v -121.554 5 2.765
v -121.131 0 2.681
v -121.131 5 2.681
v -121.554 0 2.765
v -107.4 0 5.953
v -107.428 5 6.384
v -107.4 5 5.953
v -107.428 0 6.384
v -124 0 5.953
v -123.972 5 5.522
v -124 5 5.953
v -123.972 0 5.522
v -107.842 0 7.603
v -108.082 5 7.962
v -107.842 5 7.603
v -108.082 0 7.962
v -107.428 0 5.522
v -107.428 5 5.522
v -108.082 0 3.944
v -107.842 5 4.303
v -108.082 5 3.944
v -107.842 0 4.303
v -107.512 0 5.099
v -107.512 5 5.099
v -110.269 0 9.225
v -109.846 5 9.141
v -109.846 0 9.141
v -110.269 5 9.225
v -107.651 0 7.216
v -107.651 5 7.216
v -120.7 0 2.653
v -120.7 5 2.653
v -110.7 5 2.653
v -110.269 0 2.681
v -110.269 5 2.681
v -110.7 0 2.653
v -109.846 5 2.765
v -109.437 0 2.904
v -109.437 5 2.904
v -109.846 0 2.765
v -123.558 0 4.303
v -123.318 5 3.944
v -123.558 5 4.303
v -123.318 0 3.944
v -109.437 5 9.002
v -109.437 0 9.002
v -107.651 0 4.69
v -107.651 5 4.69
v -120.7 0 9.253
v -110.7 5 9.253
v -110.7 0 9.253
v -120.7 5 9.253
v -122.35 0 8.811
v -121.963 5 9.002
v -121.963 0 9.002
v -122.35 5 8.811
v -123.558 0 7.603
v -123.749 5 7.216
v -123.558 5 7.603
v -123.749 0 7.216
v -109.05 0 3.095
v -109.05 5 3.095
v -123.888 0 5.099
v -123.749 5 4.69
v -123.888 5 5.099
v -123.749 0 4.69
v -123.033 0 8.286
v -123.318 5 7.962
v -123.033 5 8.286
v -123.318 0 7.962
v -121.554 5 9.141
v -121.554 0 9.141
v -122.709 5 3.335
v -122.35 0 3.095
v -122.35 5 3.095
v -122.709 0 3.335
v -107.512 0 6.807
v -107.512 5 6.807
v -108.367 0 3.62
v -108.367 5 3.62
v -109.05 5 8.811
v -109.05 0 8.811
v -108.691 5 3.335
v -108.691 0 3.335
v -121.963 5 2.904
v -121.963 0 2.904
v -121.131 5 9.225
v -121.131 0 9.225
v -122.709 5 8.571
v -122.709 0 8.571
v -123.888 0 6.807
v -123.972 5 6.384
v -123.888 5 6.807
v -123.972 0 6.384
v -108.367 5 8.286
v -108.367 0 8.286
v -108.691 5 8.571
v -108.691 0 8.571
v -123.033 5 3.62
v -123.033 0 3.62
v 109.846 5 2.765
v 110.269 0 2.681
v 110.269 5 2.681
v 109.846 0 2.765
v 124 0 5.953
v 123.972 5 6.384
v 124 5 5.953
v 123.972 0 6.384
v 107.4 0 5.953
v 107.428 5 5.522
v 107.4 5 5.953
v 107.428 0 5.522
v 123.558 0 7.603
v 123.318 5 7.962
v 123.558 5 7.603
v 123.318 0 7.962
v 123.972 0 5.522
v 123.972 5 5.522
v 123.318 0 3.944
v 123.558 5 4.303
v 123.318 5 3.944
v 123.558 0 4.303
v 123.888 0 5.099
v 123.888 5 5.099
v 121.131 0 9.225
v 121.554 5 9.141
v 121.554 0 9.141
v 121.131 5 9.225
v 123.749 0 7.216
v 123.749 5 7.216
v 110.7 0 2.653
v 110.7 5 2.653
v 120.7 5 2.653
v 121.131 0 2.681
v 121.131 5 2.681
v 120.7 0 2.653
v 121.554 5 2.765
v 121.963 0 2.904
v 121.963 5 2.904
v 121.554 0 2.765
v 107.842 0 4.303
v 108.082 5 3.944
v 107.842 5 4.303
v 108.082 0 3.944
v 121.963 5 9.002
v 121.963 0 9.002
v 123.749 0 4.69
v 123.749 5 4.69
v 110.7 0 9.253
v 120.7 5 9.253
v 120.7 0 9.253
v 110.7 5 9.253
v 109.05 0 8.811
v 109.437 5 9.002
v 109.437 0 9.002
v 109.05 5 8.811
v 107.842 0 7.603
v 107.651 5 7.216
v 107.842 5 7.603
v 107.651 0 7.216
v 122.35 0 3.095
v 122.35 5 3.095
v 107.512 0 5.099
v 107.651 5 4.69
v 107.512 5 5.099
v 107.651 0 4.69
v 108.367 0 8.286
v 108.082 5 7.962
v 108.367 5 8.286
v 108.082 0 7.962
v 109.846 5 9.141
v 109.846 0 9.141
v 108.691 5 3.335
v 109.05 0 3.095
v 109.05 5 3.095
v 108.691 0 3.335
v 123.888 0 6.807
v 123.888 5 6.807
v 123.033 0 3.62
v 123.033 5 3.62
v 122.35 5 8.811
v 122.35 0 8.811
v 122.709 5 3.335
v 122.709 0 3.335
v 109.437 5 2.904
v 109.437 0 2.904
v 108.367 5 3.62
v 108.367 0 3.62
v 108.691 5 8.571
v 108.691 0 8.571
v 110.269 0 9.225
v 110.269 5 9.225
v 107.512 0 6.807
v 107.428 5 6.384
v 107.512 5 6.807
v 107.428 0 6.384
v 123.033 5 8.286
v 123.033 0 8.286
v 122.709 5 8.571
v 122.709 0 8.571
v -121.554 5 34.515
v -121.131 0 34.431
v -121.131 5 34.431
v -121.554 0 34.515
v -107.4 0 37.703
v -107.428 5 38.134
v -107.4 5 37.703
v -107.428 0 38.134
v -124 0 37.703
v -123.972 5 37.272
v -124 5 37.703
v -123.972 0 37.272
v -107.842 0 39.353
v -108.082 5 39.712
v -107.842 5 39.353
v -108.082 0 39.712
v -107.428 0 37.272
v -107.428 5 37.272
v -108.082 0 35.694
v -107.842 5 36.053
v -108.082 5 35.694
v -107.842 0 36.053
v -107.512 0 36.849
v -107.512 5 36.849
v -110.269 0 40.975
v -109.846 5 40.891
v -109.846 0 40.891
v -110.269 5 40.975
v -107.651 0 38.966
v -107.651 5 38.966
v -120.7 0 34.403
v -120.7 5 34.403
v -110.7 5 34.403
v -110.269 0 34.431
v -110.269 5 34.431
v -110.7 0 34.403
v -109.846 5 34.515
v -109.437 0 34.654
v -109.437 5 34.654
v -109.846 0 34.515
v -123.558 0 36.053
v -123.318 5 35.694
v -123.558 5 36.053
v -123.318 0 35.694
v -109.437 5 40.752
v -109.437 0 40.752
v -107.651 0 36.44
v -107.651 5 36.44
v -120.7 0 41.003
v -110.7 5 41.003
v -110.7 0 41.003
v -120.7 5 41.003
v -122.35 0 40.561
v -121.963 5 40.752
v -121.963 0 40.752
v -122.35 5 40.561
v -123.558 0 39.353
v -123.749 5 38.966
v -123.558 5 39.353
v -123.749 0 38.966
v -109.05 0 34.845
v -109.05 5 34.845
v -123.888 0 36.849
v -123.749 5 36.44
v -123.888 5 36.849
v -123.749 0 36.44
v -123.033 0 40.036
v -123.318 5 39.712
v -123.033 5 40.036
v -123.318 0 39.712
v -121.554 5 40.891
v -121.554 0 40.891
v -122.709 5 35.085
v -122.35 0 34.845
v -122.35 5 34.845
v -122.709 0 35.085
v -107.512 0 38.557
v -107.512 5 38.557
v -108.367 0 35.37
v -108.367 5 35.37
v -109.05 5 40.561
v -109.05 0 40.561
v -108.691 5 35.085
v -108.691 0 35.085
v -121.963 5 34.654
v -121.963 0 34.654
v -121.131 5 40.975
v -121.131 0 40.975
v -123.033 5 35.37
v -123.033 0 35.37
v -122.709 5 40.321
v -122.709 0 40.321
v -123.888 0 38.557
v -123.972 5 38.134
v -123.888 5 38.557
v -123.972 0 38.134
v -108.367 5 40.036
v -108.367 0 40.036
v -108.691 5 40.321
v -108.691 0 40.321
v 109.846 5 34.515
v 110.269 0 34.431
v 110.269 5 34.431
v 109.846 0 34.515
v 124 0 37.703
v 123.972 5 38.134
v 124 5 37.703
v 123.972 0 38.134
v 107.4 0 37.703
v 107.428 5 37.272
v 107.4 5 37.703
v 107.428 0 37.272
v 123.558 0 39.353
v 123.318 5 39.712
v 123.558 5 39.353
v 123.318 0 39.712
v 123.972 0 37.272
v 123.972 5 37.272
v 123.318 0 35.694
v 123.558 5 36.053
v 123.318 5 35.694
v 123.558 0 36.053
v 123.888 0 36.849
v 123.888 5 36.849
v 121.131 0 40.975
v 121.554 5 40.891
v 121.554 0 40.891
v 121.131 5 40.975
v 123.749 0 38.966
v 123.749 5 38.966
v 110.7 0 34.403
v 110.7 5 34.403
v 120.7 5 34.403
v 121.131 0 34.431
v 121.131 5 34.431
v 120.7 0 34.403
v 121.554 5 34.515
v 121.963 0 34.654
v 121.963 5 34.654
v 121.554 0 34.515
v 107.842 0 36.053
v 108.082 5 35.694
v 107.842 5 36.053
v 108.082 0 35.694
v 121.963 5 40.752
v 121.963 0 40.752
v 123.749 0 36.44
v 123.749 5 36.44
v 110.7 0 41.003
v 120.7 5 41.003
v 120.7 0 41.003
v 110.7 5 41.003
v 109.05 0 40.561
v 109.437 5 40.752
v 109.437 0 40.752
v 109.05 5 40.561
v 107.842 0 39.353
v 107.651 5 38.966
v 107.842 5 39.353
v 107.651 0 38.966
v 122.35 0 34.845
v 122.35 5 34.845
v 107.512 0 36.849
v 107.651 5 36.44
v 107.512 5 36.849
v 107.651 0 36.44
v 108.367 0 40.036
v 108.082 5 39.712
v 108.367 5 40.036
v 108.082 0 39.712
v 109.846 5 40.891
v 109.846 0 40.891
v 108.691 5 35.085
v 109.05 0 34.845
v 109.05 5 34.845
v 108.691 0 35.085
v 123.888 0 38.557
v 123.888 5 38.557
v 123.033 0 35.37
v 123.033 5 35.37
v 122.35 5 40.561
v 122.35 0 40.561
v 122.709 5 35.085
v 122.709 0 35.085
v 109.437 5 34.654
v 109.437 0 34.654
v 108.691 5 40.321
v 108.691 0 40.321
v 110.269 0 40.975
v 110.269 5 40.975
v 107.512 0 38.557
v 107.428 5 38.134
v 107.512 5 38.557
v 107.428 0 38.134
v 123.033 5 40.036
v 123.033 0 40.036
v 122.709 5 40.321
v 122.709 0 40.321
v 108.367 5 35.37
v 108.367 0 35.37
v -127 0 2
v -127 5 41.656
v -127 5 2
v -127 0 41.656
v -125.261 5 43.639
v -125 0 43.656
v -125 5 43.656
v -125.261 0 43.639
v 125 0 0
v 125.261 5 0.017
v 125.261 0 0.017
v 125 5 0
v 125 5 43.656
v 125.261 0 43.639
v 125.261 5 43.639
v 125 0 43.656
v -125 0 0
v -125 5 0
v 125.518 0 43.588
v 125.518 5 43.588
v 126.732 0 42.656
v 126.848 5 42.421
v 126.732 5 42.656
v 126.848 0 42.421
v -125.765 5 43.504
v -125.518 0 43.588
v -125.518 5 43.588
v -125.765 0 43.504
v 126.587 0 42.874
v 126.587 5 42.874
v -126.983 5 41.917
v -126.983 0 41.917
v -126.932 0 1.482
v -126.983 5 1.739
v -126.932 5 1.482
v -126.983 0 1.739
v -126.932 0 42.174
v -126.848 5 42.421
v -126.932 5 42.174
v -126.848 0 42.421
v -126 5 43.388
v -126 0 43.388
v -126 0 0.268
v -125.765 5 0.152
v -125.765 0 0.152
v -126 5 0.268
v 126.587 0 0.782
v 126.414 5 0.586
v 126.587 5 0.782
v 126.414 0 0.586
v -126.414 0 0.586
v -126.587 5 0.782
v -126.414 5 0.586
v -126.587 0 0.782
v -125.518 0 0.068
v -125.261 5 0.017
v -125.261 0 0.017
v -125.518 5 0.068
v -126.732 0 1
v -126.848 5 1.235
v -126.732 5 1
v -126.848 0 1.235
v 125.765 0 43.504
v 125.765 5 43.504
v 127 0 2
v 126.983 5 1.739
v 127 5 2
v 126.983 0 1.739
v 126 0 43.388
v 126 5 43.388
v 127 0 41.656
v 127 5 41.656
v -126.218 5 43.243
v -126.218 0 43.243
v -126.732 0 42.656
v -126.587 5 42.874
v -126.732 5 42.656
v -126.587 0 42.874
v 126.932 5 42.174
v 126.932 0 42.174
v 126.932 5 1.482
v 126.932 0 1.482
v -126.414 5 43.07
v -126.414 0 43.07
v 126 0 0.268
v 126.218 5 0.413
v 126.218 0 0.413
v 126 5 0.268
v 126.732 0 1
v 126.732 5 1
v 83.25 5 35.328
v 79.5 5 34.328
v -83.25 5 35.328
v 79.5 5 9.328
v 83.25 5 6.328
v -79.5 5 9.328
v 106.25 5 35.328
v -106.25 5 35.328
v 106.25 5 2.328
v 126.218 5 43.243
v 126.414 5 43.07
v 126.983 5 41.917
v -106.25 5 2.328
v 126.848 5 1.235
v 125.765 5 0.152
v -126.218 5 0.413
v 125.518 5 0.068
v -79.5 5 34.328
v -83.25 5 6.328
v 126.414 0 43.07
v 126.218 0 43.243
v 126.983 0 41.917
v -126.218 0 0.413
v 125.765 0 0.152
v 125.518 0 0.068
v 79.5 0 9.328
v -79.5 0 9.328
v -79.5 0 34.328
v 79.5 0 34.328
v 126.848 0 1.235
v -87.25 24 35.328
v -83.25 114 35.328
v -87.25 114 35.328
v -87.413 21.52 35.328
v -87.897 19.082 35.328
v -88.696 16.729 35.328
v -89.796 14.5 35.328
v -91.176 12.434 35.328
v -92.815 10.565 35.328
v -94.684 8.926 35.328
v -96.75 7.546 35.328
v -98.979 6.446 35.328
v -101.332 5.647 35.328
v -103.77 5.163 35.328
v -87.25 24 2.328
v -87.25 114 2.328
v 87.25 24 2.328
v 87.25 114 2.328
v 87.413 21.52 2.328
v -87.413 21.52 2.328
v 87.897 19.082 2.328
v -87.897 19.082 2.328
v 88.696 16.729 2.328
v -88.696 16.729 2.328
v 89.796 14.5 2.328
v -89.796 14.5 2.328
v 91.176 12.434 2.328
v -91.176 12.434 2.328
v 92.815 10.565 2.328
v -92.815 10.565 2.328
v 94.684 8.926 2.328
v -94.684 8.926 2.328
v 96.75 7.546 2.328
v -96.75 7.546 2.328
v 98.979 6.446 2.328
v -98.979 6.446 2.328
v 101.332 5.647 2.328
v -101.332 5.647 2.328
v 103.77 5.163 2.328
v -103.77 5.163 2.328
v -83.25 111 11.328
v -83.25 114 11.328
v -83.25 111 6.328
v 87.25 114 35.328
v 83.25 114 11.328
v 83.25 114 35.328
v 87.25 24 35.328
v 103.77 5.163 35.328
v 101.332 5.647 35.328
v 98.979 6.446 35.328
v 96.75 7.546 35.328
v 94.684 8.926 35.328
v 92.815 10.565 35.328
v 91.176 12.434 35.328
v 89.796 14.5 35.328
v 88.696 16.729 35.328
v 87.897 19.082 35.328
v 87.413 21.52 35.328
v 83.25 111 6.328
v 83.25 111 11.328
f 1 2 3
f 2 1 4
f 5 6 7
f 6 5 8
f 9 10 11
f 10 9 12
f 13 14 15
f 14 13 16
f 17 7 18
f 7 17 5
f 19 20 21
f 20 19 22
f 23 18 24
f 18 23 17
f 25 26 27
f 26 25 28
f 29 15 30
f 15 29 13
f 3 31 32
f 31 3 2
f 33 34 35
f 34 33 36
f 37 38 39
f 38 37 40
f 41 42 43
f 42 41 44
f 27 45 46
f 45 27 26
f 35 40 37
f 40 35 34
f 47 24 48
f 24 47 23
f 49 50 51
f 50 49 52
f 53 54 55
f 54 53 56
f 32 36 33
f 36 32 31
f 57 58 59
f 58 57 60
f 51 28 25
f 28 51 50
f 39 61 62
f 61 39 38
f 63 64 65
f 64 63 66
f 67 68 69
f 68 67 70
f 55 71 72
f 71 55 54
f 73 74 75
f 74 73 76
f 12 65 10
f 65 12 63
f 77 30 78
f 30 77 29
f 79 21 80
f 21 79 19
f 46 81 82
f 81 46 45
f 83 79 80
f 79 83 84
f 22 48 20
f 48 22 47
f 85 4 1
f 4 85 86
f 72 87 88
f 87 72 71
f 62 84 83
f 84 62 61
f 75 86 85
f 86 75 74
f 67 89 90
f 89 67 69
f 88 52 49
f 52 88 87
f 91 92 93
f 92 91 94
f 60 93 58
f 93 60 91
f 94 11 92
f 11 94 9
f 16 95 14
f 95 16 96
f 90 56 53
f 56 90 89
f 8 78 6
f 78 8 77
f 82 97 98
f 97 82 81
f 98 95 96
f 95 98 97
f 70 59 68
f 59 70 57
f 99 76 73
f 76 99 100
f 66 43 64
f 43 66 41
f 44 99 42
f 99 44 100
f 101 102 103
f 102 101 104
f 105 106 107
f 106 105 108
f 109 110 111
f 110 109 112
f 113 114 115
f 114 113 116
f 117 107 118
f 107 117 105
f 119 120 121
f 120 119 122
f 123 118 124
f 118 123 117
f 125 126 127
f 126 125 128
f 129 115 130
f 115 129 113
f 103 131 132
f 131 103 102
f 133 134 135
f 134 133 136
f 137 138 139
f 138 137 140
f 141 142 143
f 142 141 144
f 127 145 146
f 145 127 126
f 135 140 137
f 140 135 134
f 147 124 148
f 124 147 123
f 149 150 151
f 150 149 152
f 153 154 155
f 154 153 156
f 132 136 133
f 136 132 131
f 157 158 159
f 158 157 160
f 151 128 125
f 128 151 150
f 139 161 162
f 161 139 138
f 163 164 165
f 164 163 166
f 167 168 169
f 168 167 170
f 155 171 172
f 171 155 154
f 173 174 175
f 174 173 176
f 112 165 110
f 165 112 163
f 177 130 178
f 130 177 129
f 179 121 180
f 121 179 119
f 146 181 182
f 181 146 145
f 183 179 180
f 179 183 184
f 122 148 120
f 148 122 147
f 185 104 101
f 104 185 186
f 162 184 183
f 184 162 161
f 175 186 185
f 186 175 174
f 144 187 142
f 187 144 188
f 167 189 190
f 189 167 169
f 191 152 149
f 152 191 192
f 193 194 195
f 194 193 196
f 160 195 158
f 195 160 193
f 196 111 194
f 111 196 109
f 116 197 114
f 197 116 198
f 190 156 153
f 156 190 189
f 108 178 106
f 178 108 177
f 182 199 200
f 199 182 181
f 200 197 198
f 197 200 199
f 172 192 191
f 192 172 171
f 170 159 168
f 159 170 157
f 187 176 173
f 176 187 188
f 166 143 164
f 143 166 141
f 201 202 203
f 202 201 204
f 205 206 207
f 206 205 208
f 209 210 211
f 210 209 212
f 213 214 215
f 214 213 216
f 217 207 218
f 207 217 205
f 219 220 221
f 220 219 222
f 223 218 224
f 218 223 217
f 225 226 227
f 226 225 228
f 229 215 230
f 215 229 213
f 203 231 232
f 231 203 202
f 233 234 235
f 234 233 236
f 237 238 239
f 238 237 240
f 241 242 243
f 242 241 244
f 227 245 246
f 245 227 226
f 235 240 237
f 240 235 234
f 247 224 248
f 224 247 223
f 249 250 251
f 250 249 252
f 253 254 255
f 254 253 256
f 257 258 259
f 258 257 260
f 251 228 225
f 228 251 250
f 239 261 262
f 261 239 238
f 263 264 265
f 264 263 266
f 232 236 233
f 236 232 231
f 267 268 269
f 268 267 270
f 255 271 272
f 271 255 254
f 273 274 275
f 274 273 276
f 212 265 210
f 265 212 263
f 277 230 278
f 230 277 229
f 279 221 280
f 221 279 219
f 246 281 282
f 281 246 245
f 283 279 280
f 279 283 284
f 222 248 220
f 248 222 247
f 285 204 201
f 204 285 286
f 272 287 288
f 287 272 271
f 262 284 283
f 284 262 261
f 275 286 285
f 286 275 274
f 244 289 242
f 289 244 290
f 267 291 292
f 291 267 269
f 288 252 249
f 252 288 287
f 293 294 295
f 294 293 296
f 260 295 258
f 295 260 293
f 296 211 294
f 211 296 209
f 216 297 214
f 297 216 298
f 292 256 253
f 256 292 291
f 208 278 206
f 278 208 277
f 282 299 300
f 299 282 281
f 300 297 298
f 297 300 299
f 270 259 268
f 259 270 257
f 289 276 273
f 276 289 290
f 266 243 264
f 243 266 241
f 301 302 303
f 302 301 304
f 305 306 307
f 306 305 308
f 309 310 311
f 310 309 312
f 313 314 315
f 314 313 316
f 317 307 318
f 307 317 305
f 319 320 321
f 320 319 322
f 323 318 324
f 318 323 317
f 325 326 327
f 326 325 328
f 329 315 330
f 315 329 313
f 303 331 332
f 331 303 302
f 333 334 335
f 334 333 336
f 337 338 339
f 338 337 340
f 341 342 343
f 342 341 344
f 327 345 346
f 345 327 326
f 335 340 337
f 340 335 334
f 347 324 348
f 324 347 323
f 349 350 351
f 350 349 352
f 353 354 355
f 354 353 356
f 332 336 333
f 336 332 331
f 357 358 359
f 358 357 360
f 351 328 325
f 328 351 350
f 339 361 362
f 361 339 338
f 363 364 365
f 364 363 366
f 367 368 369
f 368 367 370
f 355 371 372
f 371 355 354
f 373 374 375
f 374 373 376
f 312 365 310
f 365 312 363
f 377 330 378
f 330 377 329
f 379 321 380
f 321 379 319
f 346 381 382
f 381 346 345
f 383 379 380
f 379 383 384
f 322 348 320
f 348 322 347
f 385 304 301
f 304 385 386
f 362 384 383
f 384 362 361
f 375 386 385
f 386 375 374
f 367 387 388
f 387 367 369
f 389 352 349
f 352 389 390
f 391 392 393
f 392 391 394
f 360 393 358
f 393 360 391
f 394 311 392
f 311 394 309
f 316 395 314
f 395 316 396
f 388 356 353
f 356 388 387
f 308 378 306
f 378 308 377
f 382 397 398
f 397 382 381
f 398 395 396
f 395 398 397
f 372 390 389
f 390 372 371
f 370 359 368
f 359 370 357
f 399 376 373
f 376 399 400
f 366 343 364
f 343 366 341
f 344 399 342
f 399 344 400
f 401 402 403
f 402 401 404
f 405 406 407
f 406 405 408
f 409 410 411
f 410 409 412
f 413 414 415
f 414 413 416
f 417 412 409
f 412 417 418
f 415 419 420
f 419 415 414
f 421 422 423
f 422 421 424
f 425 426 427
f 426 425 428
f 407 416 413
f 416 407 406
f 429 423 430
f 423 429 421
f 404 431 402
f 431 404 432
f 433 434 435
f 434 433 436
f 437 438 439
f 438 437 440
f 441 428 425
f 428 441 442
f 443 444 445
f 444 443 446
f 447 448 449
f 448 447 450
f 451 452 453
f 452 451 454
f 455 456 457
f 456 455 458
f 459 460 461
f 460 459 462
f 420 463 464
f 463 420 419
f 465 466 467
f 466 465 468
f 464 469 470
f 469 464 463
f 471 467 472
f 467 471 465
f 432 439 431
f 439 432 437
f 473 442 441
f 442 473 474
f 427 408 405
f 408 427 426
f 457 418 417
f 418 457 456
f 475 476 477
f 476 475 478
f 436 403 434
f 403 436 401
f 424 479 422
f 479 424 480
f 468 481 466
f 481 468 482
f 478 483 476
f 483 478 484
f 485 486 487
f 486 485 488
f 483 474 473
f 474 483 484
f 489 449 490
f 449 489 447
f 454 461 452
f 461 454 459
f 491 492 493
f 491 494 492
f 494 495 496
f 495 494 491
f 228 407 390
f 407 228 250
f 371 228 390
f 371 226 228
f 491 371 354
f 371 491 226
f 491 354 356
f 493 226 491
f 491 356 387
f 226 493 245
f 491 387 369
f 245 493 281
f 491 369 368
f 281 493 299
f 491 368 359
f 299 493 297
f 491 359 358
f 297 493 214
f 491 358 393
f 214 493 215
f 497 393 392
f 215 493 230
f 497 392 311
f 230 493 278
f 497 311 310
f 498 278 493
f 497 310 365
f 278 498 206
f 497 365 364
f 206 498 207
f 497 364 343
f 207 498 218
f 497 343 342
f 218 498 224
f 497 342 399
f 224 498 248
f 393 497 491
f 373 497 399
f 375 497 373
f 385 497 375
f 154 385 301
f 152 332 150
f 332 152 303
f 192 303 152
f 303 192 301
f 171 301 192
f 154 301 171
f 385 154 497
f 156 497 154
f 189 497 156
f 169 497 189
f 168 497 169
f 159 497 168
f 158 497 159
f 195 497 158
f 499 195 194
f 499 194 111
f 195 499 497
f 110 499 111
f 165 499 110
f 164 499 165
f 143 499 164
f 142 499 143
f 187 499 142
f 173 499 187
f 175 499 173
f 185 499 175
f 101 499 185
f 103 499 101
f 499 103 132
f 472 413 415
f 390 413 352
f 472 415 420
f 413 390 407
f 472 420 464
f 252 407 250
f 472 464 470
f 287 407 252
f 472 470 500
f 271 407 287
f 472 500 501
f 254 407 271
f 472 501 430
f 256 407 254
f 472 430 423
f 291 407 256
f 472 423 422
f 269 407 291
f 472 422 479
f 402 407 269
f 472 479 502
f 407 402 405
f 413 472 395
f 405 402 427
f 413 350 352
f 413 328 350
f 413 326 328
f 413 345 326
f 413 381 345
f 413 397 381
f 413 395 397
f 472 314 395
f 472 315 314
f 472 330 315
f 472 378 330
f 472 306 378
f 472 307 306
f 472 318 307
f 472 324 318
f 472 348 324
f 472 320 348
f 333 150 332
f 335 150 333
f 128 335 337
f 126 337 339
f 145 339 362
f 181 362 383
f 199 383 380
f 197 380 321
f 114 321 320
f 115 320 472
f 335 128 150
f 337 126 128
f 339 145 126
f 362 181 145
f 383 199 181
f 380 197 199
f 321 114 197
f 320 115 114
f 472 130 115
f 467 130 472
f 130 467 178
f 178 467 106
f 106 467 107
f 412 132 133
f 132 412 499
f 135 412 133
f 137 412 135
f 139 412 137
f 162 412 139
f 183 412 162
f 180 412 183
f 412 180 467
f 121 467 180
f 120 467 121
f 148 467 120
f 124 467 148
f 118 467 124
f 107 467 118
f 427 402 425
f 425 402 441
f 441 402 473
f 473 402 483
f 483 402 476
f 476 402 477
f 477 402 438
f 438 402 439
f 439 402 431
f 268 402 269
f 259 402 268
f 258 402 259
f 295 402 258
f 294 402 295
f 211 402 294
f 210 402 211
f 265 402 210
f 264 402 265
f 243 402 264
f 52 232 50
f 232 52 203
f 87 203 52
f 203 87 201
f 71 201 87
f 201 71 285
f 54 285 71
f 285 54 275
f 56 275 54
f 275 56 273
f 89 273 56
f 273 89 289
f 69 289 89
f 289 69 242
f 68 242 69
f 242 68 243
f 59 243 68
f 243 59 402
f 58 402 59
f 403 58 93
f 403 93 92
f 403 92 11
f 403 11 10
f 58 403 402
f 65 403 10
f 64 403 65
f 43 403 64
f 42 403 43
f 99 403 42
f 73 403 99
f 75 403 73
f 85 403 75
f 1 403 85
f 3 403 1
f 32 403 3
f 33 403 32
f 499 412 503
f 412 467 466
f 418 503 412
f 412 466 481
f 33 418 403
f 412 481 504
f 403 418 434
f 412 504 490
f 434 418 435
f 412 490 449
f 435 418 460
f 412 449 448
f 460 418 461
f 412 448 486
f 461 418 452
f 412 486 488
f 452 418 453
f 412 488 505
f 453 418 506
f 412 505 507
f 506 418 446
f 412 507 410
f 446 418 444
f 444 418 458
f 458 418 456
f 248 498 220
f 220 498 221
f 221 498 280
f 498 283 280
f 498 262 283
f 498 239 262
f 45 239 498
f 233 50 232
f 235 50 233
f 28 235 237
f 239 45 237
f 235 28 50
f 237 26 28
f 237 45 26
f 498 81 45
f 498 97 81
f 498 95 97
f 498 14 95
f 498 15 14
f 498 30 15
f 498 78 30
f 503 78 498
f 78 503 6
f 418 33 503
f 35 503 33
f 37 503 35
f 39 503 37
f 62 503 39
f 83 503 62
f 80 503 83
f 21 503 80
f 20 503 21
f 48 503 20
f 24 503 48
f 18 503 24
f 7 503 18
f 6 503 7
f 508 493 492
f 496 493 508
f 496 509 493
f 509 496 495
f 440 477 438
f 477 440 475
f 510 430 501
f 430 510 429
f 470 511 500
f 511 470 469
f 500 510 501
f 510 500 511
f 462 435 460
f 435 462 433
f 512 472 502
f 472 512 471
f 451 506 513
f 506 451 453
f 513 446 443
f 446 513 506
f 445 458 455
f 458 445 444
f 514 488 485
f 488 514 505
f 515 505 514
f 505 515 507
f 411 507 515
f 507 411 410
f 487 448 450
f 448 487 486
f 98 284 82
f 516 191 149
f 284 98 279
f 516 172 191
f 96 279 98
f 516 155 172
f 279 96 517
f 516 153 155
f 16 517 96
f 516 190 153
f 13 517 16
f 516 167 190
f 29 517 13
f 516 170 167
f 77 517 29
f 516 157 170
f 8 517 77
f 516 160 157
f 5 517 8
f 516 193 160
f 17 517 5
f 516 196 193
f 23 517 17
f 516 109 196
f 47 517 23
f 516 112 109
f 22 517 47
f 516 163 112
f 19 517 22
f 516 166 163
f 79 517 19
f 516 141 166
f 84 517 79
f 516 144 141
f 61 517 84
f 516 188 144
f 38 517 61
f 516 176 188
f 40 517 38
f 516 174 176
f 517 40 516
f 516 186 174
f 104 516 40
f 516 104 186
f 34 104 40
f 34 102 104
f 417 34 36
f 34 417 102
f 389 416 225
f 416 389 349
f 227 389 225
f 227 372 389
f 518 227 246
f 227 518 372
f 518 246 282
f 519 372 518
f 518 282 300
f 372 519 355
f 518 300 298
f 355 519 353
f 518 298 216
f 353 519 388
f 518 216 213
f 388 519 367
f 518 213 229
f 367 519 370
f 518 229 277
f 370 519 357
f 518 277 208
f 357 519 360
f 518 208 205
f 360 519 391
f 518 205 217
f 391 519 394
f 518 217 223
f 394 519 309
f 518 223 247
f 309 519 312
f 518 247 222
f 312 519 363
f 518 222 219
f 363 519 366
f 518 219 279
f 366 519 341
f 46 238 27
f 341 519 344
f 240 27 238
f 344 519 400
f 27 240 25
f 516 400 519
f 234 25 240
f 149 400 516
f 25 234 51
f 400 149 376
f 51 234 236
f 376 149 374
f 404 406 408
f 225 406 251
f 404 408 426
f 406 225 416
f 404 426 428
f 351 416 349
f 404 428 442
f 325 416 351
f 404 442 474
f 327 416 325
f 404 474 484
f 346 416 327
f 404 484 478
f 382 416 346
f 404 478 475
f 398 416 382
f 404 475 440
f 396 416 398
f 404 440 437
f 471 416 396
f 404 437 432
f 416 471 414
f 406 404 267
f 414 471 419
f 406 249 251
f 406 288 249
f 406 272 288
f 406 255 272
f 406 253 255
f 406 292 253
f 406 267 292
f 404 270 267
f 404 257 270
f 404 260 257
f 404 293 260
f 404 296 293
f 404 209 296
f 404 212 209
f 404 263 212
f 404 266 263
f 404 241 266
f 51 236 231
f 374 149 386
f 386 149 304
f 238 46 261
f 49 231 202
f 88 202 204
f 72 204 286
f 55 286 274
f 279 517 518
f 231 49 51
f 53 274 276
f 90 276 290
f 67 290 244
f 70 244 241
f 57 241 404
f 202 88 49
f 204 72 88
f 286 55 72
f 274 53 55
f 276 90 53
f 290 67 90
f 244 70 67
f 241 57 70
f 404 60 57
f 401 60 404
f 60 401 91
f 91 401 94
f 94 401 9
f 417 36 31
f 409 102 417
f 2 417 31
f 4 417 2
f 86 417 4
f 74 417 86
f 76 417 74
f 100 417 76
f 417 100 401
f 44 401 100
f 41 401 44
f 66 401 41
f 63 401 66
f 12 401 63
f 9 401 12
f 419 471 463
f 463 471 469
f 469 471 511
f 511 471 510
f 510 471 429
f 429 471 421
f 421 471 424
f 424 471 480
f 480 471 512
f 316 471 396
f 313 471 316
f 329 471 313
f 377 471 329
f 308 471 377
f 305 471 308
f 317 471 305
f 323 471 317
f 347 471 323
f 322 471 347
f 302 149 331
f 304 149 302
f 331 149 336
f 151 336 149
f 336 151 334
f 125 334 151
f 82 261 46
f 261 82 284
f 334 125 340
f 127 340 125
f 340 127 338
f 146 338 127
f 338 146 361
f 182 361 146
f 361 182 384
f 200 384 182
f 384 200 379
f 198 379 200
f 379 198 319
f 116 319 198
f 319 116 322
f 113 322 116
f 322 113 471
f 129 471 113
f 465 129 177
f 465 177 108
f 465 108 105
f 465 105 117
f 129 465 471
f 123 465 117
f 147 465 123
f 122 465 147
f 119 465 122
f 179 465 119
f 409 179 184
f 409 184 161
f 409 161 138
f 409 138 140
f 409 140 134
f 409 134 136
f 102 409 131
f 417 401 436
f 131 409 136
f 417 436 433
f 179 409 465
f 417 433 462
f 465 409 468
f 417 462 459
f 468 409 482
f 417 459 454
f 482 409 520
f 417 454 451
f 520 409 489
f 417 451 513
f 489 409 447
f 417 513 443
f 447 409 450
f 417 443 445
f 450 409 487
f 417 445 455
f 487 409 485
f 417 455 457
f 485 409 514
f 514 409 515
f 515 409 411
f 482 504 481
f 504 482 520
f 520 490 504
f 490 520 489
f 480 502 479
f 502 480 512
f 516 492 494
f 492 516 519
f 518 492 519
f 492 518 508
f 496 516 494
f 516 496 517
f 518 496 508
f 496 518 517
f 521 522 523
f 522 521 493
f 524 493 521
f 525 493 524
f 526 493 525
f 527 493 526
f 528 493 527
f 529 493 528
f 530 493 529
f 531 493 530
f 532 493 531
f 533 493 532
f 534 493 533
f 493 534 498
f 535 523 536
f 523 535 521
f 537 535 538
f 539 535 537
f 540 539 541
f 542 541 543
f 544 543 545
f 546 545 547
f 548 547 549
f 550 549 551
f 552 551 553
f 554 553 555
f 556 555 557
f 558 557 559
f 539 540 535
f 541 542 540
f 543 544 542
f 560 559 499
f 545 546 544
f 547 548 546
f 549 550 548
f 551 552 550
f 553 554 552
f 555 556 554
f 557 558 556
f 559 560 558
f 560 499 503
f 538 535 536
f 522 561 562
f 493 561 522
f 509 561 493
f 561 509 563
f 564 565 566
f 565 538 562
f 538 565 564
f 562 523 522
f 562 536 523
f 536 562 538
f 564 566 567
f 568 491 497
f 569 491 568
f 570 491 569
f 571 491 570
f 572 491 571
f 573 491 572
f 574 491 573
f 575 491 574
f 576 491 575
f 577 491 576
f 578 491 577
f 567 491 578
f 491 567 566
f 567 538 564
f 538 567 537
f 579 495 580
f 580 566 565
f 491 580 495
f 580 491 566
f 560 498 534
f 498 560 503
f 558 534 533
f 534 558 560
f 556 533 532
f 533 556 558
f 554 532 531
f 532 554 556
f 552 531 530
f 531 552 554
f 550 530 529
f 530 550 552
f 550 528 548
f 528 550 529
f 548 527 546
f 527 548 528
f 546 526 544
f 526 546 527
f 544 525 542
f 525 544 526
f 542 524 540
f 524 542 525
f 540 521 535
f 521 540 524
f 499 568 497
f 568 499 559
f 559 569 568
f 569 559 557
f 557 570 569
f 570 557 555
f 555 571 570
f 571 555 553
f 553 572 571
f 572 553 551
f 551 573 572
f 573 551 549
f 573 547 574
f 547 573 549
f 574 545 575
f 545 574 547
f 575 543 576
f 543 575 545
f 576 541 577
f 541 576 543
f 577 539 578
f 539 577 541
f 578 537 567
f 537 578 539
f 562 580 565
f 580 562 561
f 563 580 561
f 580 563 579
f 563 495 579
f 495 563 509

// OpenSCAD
// Mounting bracket for a BNC distribution amplifier in a 10" benchtop rack, 1U.
// Geometry comes from ../lib/rack10.scad; this file only holds the amplifier's numbers.
//
//   * The BNC outputs are on the front, so that face goes to the front through
//     an aperture 3 mm smaller than the case on every side. The single input
//     is on the back.
//   * Shelf with solid side fins and a low fixed lip across the rear of the
//     shelf that stops the unit sliding back when cables are pushed onto the
//     front BNCs. The lip is 5 mm high, well below the input BNC on the back.
//     The unit is dropped in from above and lifted straight out.
//
// Case measured: 165 wide x 105 deep x 31 mm tall.
//
// Print with the front panel face down on the bed (print_orientation = true).

use <../lib/rack10.scad>

/* [Distribution amplifier] */
unit_w = 165;               // BNC face, becomes the front
unit_d = 105;
unit_h = 31;

/* [Bracket] */
rack_u = 1;
lip = 3;                    // panel overlaps the unit by this much on each side
side_clear = 0.75;          // clearance between unit and each side wall
rear_clear = 1.0;           // clearance between unit and the rear stop
shelf_t = 4;                // shelf thickness (6.3 mm available under the unit)
wall_t = 4;                 // side wall thickness
wall_above_shelf = 29;      // side wall height above the shelf top
wall_bottom = 0.5;          // side walls extend down to this z (stiffens the shelf)
fillet_r = 19;              // fillet between the outside of each side wall and the panel
                            // (0: none); max ~19 before it reaches the mounting slots
rear_stop_t = 3;            // rear lip thickness
rear_stop_h = 5;            // rear lip height above the shelf (0 for none)

/* [Rendering] */
print_orientation = false;  // true: lay the bracket with the front panel on the bed
show_unit = false;          // ghost of the amplifier for checking fit
$fn = 48;

unit = [unit_w, unit_d, unit_h];

print_oriented(print_orientation) {
    shelf_bracket(unit, rack_u = rack_u, lip = lip,
                  side_clear = side_clear, rear_clear = rear_clear,
                  shelf_t = shelf_t, wall_t = wall_t,
                  wall_above_shelf = wall_above_shelf, wall_bottom = wall_bottom,
                  rear_stop_t = rear_stop_t, rear_stop_h = rear_stop_h,
                  fillet_r = fillet_r);
    if (show_unit) unit_ghost(unit, rack_u);
}
